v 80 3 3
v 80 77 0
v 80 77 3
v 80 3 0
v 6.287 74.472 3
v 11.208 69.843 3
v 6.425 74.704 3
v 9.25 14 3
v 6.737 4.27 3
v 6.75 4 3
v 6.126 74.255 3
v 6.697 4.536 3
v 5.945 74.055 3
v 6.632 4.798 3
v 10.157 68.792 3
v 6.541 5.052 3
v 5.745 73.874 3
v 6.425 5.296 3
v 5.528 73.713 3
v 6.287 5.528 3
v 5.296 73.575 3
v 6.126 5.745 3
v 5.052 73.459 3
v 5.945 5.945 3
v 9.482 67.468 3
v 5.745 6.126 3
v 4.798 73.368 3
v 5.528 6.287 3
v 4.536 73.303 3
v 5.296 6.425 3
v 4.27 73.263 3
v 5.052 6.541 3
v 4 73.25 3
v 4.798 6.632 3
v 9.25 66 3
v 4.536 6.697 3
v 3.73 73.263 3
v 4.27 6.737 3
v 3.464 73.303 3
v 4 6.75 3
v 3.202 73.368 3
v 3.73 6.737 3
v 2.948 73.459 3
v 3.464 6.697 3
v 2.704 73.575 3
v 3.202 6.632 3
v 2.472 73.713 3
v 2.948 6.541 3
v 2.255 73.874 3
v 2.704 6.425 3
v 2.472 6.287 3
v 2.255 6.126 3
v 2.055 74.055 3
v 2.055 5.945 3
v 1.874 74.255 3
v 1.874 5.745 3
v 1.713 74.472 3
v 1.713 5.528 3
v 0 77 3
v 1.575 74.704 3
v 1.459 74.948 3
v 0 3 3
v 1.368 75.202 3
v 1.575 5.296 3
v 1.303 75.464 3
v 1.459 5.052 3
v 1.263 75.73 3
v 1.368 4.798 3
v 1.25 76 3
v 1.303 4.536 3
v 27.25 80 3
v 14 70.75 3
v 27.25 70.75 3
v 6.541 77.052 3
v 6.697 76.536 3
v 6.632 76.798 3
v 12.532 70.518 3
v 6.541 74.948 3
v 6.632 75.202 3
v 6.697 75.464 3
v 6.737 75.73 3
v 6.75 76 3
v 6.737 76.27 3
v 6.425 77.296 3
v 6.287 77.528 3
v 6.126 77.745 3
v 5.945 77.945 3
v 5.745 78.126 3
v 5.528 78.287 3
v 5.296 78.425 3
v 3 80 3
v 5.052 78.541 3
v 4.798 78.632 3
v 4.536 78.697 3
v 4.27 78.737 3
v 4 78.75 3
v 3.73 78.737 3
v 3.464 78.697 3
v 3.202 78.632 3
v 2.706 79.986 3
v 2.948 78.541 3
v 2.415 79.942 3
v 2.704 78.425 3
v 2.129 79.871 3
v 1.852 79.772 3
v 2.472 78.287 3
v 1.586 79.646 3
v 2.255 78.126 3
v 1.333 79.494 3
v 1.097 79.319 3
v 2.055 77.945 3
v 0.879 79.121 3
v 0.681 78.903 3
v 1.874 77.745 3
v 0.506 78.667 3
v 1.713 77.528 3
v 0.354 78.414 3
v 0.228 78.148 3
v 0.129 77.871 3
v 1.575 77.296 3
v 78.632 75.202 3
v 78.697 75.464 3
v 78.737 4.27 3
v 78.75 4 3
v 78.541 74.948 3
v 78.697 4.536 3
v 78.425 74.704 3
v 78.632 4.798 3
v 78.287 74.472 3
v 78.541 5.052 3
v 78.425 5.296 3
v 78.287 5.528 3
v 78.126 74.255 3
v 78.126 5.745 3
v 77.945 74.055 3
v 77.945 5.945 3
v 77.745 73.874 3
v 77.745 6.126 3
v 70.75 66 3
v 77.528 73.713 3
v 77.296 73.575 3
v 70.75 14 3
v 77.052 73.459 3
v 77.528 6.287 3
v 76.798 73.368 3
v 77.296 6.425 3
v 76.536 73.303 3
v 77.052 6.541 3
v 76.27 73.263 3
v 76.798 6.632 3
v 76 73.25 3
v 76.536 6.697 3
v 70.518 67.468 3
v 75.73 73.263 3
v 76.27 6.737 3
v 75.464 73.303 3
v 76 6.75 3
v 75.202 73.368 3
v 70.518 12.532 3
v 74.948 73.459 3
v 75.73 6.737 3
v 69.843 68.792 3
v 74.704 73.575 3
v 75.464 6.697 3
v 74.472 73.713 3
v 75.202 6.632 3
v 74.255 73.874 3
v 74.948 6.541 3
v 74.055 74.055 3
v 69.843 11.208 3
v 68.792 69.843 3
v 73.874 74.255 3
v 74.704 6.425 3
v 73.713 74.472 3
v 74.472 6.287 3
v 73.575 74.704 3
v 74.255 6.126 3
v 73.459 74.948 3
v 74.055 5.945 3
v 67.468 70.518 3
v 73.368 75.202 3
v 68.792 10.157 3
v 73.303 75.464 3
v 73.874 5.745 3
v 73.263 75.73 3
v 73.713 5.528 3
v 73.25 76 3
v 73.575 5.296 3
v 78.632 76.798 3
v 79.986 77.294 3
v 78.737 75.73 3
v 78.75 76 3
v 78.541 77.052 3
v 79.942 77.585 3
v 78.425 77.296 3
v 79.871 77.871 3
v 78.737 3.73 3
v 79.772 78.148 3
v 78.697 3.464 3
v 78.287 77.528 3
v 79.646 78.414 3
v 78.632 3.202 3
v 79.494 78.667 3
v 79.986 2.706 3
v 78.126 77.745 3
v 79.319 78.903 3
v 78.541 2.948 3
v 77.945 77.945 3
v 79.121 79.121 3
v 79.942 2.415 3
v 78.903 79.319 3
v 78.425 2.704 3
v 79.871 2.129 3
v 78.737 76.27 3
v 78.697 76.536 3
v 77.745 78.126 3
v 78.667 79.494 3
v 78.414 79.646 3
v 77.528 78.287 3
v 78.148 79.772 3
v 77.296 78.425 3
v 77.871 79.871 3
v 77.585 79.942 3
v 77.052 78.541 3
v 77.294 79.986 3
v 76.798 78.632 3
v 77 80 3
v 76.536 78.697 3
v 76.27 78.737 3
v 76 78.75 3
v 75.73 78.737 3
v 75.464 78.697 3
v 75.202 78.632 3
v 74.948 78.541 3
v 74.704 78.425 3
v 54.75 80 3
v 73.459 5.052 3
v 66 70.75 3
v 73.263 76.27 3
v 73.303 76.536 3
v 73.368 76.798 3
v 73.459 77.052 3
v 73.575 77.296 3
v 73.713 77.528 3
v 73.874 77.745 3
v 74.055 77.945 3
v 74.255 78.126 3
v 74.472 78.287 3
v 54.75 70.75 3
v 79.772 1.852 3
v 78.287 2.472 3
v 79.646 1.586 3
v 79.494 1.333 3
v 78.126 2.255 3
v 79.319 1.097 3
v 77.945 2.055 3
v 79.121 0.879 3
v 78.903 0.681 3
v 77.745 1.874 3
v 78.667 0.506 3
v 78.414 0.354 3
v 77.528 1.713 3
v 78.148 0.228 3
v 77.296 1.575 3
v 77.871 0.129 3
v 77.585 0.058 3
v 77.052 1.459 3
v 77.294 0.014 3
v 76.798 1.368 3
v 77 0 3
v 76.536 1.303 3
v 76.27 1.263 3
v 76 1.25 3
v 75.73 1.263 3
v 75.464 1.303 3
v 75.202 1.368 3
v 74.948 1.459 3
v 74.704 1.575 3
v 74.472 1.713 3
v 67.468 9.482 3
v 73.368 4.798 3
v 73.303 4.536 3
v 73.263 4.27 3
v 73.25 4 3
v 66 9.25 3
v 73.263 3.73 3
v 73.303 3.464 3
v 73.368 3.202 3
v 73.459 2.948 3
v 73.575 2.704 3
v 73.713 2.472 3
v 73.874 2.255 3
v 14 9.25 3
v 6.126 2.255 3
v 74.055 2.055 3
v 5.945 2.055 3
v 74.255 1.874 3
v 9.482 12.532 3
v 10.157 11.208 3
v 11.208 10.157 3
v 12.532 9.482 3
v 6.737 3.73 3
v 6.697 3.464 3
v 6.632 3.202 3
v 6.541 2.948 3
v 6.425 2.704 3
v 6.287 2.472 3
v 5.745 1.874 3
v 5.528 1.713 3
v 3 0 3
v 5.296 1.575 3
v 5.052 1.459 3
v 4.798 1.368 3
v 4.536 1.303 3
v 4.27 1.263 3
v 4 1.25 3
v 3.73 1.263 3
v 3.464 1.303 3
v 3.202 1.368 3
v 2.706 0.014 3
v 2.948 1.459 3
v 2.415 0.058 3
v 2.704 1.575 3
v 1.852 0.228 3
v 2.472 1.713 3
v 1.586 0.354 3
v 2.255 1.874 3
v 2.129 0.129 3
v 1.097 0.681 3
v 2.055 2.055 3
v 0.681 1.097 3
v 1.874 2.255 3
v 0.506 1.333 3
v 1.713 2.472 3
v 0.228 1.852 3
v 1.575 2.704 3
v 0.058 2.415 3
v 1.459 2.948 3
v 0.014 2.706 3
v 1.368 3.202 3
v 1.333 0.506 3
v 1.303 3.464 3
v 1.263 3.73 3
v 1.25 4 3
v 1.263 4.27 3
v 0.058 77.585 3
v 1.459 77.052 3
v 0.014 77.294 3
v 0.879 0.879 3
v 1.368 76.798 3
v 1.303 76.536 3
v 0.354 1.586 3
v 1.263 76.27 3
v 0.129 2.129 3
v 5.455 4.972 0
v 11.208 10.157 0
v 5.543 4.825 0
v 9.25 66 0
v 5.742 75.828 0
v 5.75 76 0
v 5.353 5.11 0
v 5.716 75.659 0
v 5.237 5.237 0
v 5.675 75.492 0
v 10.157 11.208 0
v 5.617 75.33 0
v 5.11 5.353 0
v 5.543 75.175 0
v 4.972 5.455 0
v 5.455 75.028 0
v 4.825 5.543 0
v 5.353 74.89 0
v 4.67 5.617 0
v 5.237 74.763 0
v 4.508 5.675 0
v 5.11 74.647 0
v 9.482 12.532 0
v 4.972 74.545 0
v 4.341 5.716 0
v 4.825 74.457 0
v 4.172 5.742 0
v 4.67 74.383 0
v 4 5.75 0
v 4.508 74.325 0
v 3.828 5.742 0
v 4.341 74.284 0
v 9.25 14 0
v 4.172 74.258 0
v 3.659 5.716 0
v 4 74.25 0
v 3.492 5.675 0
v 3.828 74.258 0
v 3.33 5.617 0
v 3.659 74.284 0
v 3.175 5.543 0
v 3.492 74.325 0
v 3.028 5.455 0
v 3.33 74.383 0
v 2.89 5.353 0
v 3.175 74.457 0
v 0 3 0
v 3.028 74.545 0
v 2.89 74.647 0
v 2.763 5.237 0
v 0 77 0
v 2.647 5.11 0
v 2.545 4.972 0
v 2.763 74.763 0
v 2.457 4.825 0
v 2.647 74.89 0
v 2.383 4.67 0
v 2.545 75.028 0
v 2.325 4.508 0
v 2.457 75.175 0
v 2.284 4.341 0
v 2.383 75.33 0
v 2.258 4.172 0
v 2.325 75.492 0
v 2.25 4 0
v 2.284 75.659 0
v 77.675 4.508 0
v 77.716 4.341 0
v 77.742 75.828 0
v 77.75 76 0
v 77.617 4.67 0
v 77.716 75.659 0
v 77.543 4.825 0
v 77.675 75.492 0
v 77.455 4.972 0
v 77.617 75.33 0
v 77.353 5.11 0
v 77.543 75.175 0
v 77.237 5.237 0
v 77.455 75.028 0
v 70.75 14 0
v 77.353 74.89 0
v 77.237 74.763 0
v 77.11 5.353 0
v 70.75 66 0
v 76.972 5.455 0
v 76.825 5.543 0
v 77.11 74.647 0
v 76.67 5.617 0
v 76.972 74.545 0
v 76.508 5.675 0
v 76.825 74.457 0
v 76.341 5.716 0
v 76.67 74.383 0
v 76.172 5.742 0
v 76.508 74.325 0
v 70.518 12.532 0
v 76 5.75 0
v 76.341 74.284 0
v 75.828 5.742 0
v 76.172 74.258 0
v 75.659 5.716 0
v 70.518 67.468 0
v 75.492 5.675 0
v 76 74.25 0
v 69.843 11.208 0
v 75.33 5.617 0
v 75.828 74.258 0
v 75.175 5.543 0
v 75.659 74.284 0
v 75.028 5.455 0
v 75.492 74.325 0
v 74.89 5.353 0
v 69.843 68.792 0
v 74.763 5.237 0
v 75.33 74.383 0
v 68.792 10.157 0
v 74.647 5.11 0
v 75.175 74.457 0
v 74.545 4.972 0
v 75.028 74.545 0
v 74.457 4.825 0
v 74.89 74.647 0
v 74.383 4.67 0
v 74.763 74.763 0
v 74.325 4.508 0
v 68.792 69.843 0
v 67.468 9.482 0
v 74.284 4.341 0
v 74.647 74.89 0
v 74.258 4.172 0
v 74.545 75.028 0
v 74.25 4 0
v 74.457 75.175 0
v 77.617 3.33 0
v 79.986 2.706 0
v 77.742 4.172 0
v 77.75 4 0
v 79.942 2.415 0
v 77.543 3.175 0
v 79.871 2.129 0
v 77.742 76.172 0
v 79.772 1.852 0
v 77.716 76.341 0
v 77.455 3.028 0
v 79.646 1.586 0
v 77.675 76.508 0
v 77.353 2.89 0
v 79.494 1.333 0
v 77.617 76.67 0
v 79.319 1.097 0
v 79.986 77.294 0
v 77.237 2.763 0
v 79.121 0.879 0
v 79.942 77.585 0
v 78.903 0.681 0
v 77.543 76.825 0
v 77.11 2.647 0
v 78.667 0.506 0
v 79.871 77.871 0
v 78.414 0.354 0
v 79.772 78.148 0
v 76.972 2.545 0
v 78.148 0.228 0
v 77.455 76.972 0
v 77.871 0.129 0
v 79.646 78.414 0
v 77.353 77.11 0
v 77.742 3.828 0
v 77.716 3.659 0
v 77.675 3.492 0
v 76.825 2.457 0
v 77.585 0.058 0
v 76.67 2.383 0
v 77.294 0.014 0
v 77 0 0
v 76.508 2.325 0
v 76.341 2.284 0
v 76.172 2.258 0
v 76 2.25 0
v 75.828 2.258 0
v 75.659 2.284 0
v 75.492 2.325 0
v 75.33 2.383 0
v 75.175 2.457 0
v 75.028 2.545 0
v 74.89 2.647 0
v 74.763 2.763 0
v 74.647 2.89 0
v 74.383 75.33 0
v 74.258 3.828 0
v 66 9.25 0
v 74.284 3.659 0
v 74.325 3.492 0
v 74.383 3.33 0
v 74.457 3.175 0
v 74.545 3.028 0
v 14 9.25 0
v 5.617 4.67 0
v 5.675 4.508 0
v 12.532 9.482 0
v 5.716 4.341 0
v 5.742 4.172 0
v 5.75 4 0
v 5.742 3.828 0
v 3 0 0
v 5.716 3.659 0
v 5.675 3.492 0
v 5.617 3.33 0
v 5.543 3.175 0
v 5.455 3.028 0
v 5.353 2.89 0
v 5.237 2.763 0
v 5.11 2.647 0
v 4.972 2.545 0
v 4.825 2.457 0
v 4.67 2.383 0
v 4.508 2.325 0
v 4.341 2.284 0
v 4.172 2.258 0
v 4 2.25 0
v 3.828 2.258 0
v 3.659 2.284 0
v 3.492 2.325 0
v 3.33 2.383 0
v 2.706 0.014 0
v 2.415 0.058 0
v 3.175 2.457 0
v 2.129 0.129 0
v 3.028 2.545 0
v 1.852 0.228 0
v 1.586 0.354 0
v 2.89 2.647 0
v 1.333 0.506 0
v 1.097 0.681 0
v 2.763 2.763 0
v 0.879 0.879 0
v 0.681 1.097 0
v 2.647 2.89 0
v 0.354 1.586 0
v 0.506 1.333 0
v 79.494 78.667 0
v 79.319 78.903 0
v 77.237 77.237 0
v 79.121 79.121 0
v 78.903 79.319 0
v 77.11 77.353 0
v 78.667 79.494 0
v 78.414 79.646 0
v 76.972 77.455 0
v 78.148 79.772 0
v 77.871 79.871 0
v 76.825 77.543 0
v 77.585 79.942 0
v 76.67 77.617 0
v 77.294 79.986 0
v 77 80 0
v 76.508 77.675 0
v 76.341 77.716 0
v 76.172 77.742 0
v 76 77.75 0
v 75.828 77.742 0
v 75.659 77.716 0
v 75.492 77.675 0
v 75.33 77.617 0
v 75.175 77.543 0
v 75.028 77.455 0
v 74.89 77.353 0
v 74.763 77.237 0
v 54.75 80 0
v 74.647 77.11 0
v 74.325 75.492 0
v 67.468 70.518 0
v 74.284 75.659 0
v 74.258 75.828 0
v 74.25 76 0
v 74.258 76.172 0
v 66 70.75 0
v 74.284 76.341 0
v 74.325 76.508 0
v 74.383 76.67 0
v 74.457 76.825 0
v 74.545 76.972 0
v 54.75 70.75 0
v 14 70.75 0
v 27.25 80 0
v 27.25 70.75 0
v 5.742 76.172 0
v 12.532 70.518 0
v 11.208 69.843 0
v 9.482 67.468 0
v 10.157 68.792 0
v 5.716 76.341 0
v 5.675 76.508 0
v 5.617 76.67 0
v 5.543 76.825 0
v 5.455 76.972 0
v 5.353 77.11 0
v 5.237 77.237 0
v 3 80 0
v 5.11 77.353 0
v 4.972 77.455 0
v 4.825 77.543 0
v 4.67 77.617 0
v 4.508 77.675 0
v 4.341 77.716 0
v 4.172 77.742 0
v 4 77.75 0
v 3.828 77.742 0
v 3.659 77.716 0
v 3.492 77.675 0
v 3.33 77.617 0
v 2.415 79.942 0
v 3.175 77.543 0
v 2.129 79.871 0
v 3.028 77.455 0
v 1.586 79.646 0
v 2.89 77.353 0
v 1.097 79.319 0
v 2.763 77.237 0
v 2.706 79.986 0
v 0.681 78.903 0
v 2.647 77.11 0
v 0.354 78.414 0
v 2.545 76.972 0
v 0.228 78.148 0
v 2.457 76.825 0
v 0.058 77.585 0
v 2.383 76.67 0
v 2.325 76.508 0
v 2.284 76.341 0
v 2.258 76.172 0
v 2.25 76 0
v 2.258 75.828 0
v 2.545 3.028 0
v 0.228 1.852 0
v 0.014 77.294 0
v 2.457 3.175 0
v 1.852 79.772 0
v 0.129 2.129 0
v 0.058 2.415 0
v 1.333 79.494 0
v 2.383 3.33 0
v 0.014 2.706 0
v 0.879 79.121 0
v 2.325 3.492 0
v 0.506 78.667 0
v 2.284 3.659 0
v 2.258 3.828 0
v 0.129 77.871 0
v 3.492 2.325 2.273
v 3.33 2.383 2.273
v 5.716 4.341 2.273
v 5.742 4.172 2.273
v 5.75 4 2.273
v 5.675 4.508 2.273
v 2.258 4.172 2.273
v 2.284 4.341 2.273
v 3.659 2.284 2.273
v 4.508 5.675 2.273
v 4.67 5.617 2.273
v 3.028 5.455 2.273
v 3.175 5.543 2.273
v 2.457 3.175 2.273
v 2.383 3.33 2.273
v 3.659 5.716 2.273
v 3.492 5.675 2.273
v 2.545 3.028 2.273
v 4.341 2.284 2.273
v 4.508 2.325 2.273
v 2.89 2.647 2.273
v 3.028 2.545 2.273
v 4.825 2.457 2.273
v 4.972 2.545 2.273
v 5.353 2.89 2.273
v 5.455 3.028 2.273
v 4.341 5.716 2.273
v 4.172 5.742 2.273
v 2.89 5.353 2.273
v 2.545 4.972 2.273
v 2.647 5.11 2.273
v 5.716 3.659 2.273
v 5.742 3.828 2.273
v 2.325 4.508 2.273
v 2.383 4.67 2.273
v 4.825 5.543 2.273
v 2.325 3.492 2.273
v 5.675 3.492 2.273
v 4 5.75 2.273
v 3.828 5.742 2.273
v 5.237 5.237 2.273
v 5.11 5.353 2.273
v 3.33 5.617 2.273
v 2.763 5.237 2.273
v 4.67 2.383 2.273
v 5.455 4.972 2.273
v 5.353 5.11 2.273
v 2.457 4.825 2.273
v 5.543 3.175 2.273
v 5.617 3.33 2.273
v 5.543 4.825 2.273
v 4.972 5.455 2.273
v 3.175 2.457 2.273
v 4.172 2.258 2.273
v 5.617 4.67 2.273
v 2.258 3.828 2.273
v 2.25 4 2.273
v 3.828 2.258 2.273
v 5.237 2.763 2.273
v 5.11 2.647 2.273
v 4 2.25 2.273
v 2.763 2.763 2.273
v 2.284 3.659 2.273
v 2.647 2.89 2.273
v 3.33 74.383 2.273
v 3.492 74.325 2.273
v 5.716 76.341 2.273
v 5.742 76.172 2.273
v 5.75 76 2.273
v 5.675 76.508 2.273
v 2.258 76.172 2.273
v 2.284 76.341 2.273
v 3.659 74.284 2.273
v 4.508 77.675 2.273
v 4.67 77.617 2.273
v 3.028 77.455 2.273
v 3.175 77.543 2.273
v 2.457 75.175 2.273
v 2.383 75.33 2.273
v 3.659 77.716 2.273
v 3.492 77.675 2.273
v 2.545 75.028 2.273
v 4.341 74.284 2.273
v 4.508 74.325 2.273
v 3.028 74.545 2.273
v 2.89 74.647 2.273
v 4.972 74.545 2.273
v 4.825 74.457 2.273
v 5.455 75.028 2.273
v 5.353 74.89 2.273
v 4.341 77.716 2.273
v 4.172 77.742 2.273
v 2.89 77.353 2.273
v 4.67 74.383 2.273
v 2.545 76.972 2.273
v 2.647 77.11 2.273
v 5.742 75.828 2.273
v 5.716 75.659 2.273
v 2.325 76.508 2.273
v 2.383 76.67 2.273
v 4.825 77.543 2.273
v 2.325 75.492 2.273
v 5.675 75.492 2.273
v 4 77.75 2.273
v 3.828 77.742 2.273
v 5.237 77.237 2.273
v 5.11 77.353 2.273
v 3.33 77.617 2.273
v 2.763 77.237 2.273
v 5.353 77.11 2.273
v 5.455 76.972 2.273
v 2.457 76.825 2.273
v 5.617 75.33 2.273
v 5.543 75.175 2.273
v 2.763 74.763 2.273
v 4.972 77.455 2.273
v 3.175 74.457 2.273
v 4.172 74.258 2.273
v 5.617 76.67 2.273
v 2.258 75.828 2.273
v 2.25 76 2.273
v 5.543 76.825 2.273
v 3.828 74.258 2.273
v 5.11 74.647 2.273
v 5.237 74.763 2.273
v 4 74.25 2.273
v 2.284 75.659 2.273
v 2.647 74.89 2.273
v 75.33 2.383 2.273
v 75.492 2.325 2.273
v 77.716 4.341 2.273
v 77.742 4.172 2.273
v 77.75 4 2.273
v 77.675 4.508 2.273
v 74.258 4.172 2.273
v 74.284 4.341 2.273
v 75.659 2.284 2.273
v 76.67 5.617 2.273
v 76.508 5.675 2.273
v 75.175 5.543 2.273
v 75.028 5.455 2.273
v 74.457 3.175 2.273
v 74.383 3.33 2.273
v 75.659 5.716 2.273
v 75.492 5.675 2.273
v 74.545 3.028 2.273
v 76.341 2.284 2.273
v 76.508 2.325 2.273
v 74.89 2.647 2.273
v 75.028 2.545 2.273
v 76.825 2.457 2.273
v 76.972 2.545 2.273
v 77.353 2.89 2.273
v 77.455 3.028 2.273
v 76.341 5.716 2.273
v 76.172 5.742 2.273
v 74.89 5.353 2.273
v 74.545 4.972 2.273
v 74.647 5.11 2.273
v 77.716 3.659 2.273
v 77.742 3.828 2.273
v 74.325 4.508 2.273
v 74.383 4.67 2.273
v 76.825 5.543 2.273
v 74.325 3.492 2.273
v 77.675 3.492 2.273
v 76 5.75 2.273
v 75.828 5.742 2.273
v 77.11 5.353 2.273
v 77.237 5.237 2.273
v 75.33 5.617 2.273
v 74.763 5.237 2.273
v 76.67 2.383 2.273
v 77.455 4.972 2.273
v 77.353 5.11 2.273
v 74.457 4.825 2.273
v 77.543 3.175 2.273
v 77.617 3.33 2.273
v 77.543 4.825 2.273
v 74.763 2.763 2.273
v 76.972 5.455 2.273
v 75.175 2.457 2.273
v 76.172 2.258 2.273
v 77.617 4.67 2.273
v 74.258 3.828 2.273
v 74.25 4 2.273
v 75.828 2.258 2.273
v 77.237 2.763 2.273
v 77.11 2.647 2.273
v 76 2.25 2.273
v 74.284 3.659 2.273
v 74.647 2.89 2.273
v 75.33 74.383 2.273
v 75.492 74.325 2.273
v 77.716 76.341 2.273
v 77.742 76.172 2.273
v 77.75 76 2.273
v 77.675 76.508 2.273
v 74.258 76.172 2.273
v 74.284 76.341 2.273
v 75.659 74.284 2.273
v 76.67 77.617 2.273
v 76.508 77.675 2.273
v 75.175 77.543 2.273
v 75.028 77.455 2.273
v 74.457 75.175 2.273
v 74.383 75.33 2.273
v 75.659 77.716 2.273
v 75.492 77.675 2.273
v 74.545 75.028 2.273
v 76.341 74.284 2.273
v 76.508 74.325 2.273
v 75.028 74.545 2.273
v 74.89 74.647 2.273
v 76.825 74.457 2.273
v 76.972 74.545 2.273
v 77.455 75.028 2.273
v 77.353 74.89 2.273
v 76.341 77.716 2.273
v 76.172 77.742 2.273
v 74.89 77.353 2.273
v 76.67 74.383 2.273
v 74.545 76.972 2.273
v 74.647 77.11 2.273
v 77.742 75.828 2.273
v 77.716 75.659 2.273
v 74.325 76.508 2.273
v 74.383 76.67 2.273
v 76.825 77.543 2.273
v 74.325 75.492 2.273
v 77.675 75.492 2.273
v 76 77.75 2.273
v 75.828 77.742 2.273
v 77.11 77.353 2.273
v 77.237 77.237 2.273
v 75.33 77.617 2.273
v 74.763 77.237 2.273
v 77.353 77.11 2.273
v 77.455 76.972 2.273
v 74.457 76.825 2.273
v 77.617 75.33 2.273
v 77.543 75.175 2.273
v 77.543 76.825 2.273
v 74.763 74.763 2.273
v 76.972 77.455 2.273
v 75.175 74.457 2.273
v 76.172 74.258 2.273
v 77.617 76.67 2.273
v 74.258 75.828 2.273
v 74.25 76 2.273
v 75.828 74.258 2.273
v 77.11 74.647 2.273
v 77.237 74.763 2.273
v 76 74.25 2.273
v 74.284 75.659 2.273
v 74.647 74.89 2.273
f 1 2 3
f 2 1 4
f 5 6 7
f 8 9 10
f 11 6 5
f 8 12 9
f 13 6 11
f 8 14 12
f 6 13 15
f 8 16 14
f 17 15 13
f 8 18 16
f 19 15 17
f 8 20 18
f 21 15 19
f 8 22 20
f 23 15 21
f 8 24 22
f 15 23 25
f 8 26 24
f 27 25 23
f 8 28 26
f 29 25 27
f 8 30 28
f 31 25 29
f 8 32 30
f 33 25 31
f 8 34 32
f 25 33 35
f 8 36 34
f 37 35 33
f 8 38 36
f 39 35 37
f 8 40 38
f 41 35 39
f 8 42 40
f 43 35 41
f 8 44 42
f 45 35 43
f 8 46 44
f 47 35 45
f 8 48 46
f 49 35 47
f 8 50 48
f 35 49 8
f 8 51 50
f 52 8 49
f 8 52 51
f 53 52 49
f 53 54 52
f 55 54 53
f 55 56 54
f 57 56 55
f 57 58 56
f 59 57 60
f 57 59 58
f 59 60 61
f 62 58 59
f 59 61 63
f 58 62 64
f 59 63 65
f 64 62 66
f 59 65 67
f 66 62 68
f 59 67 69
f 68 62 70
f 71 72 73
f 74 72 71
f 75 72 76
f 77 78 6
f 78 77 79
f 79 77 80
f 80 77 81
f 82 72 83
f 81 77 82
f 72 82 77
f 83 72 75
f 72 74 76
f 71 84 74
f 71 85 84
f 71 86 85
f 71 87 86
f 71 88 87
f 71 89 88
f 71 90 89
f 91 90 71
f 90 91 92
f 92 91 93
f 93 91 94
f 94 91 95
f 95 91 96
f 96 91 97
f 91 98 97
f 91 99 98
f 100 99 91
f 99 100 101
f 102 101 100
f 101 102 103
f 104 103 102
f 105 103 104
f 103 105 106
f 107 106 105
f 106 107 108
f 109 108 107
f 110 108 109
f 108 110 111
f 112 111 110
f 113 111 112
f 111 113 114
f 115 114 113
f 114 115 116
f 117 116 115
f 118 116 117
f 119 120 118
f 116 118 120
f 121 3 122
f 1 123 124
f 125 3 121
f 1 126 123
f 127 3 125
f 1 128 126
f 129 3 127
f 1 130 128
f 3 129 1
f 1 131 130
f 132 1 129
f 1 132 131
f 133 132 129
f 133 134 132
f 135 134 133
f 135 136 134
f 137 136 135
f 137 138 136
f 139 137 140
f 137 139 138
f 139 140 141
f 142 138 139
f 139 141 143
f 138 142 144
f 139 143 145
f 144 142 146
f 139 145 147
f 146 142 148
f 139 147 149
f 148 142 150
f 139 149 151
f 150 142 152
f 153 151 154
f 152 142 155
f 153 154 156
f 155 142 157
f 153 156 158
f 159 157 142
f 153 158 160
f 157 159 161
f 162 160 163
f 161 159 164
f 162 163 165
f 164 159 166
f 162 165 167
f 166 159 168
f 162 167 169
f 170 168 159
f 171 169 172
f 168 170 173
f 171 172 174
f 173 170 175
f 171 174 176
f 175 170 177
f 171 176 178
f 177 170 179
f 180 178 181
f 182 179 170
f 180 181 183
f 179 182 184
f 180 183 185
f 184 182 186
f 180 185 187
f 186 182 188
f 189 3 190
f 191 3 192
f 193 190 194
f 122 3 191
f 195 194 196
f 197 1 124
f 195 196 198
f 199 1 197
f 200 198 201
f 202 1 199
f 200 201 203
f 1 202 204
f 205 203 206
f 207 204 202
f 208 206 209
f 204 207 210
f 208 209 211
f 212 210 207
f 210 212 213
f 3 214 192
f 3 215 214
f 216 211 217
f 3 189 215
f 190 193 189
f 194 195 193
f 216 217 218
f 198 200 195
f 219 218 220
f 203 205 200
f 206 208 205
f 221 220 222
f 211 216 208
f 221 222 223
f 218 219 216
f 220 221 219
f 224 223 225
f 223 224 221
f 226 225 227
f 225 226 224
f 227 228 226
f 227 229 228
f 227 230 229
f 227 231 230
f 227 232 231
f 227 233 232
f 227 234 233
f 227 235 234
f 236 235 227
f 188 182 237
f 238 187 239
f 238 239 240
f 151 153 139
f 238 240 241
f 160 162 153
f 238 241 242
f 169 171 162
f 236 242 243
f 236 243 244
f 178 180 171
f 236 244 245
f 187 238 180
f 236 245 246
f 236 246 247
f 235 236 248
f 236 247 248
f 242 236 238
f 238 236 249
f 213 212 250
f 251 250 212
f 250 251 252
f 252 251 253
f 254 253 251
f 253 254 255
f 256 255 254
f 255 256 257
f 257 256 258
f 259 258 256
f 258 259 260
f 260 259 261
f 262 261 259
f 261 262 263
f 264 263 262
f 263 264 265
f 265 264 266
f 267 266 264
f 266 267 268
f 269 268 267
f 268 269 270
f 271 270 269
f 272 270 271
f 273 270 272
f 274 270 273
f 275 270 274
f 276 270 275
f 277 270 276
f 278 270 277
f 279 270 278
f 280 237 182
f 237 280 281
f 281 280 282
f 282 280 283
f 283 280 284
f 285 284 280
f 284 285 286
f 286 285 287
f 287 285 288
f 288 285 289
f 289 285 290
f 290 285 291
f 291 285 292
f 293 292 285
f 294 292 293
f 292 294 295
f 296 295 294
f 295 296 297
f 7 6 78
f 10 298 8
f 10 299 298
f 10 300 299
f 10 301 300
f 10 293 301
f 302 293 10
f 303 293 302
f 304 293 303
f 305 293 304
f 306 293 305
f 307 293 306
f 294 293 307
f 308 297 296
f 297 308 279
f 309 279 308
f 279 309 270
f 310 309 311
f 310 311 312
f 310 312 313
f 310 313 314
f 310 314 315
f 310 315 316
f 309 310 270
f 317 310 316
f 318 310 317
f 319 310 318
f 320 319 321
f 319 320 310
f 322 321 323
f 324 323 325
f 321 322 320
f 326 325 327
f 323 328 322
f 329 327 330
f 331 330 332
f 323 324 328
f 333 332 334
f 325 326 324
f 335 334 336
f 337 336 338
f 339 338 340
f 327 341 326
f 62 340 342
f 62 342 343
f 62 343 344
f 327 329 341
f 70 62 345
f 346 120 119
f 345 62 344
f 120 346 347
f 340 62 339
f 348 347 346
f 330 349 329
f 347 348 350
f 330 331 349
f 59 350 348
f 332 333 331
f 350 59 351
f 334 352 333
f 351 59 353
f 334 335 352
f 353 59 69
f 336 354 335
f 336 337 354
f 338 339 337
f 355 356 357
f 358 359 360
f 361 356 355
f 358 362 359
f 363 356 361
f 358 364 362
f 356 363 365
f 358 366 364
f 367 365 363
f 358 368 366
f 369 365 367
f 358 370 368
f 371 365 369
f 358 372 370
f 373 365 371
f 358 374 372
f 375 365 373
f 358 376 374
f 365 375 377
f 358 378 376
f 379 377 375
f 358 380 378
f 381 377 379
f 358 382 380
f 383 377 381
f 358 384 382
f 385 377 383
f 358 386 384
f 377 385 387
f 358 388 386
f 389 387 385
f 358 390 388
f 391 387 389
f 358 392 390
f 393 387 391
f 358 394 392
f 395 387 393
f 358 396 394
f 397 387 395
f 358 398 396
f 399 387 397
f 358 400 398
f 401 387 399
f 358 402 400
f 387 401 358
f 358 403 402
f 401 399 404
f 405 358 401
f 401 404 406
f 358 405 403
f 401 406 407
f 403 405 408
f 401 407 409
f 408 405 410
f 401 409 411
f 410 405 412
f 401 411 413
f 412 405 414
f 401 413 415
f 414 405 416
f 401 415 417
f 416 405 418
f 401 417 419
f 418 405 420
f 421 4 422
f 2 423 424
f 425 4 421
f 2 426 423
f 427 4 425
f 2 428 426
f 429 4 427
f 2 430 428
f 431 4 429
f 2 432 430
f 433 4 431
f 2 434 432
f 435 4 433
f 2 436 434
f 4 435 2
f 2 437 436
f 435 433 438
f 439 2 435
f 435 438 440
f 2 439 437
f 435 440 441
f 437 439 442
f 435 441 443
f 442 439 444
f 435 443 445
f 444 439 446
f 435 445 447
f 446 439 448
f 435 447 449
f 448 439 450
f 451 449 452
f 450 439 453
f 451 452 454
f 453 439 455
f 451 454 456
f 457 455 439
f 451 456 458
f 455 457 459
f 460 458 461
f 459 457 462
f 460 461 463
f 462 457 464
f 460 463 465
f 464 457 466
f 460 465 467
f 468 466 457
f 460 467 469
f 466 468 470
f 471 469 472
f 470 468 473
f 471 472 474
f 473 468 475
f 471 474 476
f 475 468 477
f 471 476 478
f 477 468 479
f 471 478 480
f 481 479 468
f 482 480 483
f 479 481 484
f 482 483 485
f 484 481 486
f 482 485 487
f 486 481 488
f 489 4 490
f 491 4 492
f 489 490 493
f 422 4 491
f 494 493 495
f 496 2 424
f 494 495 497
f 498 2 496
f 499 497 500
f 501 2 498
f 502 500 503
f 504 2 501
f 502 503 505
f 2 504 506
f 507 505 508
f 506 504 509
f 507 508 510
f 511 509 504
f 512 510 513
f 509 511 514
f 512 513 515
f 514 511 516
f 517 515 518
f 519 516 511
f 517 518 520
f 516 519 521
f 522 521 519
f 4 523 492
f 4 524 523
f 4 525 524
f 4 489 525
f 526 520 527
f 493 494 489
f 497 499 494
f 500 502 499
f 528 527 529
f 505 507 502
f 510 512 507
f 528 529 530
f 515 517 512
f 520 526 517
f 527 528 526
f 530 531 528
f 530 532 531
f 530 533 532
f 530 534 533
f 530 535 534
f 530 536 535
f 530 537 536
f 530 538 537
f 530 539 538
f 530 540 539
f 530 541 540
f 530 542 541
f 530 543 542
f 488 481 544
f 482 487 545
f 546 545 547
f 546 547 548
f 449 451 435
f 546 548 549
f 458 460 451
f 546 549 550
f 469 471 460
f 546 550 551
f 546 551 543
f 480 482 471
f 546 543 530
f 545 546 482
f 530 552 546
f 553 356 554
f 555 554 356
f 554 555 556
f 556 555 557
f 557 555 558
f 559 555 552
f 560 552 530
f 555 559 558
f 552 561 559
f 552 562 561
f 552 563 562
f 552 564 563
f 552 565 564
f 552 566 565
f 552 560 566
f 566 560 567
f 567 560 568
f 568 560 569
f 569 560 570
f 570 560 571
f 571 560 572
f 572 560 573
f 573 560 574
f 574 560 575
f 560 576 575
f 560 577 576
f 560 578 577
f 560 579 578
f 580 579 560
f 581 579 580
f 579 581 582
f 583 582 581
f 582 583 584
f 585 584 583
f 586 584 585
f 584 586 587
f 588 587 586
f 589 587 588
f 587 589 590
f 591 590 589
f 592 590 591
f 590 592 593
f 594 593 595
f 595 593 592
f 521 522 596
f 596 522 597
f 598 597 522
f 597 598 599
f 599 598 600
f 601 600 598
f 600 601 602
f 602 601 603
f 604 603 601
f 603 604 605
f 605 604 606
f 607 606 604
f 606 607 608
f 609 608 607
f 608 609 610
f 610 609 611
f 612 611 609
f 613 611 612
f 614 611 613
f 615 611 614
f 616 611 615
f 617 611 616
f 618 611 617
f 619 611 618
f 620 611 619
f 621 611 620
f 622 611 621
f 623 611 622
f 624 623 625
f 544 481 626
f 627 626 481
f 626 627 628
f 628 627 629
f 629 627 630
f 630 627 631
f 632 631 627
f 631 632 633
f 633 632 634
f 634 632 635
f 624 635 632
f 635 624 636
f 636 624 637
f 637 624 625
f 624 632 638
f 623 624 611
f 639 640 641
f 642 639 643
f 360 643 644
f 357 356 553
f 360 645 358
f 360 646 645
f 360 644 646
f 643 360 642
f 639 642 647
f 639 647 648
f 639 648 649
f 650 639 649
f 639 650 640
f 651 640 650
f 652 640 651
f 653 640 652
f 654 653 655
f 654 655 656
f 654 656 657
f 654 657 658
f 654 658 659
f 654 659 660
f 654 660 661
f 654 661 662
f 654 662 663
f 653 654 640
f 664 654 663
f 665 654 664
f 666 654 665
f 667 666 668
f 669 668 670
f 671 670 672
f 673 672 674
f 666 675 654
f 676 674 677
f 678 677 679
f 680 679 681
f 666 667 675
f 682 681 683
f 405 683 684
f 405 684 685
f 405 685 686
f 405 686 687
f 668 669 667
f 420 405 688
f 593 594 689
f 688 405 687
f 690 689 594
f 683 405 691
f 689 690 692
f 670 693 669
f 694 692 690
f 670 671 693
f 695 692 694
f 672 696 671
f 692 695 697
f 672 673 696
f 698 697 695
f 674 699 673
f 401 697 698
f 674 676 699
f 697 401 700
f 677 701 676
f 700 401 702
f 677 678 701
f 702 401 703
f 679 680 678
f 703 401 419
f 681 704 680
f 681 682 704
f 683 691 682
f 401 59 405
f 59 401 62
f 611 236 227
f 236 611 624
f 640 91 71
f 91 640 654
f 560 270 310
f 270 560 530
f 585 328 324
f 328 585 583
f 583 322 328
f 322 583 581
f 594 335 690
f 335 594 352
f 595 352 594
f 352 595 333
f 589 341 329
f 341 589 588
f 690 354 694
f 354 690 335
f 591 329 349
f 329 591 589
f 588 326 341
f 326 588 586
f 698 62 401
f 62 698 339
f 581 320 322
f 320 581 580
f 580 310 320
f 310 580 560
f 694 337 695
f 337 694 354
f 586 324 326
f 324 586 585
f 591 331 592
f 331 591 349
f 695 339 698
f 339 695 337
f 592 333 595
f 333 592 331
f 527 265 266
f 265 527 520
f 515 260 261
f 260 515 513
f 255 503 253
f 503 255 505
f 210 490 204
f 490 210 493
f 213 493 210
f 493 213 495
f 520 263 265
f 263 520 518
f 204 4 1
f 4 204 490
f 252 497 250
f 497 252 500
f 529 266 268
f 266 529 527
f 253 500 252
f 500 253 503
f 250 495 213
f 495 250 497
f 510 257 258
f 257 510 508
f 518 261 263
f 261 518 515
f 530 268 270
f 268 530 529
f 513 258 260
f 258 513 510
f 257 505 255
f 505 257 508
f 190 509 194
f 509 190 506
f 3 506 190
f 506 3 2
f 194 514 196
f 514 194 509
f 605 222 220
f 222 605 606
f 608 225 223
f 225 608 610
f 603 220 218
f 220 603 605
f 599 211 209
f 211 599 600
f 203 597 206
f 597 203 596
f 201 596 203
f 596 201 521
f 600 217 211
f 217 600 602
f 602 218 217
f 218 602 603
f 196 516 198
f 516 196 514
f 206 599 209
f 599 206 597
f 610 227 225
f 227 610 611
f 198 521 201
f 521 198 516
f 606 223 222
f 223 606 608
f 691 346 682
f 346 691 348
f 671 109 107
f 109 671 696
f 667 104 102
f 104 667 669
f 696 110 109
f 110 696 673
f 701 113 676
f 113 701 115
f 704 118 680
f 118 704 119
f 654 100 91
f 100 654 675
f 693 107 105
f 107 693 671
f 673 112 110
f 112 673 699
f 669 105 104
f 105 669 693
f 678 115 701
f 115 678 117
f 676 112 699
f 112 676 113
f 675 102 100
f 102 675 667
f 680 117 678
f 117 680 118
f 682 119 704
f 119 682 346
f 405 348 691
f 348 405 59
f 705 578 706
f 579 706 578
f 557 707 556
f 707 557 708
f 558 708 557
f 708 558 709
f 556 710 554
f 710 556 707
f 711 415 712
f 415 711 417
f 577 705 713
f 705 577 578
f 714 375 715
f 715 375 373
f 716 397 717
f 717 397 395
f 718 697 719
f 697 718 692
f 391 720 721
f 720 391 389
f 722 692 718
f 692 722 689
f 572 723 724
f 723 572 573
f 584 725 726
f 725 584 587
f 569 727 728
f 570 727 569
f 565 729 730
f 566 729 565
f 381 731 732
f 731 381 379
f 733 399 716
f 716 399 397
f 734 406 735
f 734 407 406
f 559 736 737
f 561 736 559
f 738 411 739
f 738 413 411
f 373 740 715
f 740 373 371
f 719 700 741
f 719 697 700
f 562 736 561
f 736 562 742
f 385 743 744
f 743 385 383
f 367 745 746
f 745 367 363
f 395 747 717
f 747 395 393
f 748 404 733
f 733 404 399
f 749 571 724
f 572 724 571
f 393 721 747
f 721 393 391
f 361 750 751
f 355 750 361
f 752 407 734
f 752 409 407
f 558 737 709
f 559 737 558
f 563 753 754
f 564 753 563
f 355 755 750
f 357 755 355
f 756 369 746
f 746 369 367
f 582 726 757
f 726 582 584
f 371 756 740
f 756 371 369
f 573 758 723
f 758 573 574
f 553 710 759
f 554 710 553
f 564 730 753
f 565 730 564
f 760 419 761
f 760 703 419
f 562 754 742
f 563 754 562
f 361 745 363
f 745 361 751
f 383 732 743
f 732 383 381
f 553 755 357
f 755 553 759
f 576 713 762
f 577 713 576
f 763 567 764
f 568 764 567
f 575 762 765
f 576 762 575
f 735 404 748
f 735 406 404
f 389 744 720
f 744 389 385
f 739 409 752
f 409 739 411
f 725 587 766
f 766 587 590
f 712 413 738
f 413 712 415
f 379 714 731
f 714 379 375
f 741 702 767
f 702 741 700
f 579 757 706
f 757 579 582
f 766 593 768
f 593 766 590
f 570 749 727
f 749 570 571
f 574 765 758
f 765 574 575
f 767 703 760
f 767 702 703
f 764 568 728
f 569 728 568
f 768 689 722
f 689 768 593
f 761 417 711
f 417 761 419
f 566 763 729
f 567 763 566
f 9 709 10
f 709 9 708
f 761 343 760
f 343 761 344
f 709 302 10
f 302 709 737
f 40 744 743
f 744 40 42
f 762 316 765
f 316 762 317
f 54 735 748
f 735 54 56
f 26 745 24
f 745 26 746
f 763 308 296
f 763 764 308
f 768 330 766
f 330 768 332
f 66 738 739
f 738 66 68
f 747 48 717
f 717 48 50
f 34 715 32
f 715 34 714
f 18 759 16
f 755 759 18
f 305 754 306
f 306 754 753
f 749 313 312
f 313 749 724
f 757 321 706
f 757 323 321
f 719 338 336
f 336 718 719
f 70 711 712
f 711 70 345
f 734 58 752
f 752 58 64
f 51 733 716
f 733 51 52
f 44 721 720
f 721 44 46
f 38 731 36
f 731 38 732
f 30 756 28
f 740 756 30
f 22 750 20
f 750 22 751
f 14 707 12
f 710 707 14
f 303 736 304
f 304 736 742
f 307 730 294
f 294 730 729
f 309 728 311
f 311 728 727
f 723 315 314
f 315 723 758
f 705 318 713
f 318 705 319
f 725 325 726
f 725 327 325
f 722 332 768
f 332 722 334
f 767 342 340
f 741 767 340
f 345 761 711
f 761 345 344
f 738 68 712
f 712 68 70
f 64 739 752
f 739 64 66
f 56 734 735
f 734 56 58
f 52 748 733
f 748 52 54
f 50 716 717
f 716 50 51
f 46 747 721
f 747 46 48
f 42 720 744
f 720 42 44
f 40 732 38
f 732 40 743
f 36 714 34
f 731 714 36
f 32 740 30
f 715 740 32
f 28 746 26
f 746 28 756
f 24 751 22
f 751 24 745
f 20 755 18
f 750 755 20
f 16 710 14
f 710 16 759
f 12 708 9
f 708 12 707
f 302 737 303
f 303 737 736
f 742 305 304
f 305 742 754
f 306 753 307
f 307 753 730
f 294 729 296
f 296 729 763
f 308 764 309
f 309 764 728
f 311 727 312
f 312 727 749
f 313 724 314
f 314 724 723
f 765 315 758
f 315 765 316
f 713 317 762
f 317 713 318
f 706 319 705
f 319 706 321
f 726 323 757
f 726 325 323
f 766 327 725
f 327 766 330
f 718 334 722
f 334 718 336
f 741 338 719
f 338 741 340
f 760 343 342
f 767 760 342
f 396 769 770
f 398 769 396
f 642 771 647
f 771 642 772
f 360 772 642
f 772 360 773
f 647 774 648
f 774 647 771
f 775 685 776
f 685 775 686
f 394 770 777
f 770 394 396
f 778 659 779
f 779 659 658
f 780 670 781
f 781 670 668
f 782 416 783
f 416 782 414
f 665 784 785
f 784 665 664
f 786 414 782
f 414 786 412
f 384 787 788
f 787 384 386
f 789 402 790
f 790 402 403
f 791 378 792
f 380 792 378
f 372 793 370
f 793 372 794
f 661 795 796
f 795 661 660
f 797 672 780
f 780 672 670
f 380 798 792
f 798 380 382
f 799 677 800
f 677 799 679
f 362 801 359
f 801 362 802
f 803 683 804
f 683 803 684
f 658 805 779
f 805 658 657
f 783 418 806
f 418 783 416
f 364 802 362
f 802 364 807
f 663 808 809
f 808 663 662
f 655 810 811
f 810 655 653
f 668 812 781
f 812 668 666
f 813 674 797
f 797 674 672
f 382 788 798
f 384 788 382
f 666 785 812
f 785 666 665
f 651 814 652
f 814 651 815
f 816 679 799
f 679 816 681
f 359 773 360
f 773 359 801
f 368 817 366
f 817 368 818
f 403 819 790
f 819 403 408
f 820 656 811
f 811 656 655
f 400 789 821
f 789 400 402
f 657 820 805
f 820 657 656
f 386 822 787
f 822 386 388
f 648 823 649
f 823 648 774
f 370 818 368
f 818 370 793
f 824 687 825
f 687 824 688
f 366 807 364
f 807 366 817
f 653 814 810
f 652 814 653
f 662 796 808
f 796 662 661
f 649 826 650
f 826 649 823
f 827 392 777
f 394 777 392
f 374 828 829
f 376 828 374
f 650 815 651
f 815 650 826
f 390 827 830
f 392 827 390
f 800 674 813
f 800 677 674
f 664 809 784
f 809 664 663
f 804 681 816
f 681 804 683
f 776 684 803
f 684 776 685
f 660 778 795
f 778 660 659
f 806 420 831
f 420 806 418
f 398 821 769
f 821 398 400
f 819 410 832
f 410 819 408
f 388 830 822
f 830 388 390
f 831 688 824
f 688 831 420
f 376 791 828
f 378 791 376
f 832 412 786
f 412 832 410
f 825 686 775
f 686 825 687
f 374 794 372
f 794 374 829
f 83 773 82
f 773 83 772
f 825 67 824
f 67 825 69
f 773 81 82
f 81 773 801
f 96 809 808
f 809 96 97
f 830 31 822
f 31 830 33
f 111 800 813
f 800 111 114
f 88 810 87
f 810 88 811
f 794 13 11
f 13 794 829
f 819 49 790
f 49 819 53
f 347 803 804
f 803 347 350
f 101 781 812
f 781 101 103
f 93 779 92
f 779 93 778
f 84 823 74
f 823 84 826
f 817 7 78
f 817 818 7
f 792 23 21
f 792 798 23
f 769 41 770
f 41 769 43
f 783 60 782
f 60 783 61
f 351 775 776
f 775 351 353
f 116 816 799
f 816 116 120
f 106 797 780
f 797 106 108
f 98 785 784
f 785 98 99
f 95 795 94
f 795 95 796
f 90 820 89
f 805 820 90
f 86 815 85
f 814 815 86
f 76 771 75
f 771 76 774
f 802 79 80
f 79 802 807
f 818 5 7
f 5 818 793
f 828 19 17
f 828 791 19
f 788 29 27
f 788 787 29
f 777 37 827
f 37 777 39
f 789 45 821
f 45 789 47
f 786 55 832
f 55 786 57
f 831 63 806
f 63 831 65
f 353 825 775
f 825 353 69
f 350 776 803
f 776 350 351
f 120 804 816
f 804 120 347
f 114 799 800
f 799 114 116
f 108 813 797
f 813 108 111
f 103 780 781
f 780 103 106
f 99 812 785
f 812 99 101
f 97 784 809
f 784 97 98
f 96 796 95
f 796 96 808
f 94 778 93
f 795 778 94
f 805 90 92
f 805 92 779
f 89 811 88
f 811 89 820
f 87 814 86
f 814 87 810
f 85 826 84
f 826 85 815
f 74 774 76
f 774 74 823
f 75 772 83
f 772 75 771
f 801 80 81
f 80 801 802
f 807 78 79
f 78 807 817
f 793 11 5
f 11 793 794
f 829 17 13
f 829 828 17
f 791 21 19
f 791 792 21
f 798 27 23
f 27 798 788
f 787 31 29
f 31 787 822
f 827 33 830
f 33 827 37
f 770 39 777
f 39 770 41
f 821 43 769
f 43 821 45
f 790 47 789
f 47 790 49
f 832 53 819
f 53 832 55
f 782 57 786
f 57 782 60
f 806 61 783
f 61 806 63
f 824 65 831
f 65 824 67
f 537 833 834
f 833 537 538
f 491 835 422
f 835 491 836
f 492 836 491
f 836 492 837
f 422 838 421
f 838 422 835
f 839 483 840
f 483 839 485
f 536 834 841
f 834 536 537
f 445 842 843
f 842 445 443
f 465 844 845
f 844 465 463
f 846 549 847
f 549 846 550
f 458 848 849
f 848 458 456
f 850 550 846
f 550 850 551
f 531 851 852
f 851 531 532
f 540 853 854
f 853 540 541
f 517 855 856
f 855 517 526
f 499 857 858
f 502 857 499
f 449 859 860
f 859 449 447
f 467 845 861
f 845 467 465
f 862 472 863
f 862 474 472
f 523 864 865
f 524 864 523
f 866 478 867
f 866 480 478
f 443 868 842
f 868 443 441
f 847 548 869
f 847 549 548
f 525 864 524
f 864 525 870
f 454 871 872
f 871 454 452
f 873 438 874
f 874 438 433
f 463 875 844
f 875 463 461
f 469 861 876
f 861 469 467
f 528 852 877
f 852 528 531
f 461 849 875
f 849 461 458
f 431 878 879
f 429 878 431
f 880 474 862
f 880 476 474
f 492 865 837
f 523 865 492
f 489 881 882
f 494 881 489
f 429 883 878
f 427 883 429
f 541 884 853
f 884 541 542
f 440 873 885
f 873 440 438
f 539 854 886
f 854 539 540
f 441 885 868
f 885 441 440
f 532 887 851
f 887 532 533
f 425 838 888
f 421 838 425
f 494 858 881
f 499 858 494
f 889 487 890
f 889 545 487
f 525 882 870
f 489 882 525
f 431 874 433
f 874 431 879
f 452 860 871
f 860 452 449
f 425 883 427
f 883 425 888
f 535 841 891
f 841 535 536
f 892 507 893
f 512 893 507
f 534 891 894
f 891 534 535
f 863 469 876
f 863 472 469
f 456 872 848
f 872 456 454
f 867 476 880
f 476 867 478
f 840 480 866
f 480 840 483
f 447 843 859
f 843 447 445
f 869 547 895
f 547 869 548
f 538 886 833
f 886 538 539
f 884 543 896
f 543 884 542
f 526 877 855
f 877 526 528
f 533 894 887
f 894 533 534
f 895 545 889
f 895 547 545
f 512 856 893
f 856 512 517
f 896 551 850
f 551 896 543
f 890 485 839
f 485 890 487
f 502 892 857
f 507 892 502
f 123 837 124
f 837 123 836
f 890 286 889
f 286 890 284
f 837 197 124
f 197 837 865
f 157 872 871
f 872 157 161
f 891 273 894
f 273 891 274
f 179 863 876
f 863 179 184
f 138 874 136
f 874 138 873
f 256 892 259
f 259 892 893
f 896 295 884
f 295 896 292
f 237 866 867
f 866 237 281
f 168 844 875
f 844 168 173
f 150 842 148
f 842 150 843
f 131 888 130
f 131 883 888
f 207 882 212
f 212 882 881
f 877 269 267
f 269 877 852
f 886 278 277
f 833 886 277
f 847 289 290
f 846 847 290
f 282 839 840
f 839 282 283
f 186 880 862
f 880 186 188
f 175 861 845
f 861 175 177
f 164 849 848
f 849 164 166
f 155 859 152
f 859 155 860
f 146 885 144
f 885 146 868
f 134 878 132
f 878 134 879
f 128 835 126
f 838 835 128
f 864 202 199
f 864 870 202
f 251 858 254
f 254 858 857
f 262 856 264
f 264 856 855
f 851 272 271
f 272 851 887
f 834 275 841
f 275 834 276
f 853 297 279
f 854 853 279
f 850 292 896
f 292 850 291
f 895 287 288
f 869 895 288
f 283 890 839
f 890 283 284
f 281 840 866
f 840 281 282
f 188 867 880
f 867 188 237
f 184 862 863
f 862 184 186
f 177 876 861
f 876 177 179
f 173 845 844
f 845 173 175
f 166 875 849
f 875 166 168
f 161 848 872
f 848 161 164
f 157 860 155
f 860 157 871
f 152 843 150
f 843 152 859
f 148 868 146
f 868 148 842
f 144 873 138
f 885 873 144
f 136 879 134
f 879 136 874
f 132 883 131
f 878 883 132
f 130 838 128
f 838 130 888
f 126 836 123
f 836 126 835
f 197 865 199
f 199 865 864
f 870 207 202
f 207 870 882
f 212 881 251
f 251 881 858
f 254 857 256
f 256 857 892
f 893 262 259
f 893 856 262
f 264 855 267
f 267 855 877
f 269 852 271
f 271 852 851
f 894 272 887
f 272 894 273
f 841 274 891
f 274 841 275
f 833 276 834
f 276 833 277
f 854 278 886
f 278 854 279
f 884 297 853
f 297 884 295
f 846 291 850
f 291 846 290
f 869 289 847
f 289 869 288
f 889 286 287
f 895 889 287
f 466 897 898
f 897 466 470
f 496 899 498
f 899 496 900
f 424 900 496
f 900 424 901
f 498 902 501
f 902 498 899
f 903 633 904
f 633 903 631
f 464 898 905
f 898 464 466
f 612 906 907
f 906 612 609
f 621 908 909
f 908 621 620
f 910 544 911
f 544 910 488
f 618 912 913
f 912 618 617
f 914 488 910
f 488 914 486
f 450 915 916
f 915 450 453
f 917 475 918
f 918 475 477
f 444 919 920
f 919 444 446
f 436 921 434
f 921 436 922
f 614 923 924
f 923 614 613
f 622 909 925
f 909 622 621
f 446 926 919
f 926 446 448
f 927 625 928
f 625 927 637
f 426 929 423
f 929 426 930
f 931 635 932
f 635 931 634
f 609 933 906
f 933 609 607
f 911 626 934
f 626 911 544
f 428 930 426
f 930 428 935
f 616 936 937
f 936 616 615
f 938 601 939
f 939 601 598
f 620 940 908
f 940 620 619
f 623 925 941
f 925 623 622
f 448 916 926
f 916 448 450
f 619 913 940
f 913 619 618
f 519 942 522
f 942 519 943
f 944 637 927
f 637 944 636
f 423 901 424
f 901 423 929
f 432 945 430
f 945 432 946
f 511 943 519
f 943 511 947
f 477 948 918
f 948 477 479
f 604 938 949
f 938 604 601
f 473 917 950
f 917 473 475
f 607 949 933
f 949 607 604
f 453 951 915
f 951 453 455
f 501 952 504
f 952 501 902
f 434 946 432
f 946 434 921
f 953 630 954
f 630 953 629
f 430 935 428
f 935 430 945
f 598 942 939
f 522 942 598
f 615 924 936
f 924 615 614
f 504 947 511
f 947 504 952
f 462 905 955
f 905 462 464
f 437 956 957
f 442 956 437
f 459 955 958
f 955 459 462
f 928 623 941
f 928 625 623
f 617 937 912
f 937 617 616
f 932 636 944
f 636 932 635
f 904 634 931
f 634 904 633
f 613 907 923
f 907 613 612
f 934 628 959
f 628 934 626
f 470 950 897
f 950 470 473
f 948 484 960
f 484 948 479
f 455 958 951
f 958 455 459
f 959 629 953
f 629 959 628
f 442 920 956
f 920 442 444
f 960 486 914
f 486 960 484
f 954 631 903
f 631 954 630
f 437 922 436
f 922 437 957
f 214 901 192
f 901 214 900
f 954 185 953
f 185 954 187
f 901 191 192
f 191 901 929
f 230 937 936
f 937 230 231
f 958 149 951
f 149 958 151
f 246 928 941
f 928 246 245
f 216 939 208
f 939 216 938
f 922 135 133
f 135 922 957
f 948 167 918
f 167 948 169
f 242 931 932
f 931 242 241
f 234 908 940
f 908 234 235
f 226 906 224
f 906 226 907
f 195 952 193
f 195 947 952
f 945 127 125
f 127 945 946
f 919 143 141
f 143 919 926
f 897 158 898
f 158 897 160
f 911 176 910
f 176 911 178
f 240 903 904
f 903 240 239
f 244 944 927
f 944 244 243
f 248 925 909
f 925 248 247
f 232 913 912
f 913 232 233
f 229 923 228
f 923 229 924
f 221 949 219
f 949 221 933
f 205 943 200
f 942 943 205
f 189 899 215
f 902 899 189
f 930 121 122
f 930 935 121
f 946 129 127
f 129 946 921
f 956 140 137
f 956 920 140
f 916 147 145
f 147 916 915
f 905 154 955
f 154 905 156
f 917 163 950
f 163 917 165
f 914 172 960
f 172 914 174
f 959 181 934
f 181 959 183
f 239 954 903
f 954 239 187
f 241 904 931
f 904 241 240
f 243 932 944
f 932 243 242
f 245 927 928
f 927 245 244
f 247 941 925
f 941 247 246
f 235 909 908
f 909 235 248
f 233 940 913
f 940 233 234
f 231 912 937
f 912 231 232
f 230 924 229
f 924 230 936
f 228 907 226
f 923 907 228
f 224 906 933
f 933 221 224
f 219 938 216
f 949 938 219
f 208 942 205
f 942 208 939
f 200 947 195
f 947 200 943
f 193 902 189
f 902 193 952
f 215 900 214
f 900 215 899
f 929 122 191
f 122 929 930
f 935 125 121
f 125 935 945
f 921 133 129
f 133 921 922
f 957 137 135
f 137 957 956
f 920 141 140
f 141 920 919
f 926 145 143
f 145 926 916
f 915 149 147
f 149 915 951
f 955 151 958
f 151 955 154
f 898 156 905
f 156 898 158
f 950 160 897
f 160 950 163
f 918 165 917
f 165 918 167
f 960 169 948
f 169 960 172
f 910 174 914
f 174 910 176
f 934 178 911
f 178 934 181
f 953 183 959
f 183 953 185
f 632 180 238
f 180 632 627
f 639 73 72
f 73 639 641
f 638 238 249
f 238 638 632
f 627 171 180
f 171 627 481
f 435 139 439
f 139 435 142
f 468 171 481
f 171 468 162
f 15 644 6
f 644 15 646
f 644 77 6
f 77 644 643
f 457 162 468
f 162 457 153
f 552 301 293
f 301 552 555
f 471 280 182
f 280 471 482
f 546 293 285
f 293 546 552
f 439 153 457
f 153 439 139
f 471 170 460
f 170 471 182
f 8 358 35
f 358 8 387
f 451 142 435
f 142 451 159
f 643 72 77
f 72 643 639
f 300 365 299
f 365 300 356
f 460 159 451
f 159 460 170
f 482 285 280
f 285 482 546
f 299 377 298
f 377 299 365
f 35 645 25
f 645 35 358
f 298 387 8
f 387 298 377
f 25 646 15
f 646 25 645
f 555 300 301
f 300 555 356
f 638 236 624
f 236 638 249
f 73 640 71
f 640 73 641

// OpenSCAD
/* [Size and thickness] */
// fan size in mm
fan_size = 80; // [40:20:200]

tab_width_outer=88.1;
tab_height=13.5;
tab_width=12.5;
tab_offset=5.5;
heater_size=61.5;
heater_straight=52;
heater_depth=4.5;
space_after_depth=3;
fan_depth=space_after_depth;

// fan grill thickness in mm
grill_thickness = fan_depth;

// plastic thickness around the fan hole in mm
vent_wall_thickness = 1;

fan_duct_chamfer = false;

// screw hole type
screw_hole_type = "t"; // [s:Straight, t:Tapered, i:Inset]

/* [Vent grill bars] */
// number of horzontal grill bars
horizontal_bar_count = 1;
// number of vertical grill bars
vertical_bar_count = 1;

// grill bars thickness
bars_thickness = 1;

// grill bars width
bars_width = 1.2;

/* [Hidden] */
$fn = 64;

screw_hole_diameter = 3.5;
screw_hole_radius = screw_hole_diameter / 2;
screw_hole_radius_wider = screw_hole_radius + 1;
screw_support_thickness = 1;
screw_center_distance_from_edge = 4;

module PrimeShape() {
        union() {
        difference() {
            cube([fan_size, fan_size, grill_thickness]);
            
            // corner chamfer
            translate([3,0,-1])
            rotate([0,0,135])
            cube([5, 5, grill_thickness + 2]);

            translate([fan_size-3,0,-1])
            rotate([0,0,-45])
            cube([5, 5, grill_thickness + 2]);

            translate([fan_size,fan_size-3,-1])
            rotate([0,0,45])
            cube([5, 5, grill_thickness + 2]);

            translate([0,fan_size-3,-1])
            rotate([0,0,45])
            cube([5, 5, grill_thickness + 2]);
        }

        // corner roundness
        translate([3,3,grill_thickness/2])
        cylinder(r=3, h=grill_thickness, center=true);

        translate([fan_size-3,3,grill_thickness/2])
        cylinder(r=3, h=grill_thickness, center=true);

        translate([fan_size-3,fan_size-3,grill_thickness/2])
        cylinder(r=3, h=grill_thickness, center=true);

        translate([3,fan_size-3,grill_thickness/2])
        cylinder(r=3, h=grill_thickness, center=true);
    }
}

module PrimeShapeWithScrewHoles() {
    difference() {
        PrimeShape();

        // screw holes
        ScrewHole(screw_center_distance_from_edge, screw_center_distance_from_edge);
        ScrewHole(screw_center_distance_from_edge, fan_size - screw_center_distance_from_edge);
        ScrewHole(fan_size - screw_center_distance_from_edge, screw_center_distance_from_edge);
        ScrewHole(fan_size - screw_center_distance_from_edge, fan_size - screw_center_distance_from_edge);
    }
}

module ScrewHole(x, y) {
    translate([x, y, grill_thickness / 2])
    cylinder(r=screw_hole_diameter / 2, h=grill_thickness + 2, center=true);

    if (screw_hole_type == "i") {
        //inset
        translate([x, y, grill_thickness / 2 + screw_support_thickness])
        cylinder(r=screw_hole_radius + 1, h=grill_thickness, center=true);
    }

    if (screw_hole_type == "t") {
        // tapered
        translate([x, y, grill_thickness])
        cylinder(r1=0, r2=screw_hole_radius_wider * 2, h=4, center=true);
    }
}


module rounded_rect(width, height, corner_radius, extrude_height) {
    linear_extrude(extrude_height)
    minkowski() {
        square([width - 2*corner_radius, height - 2*corner_radius], center=true);
        circle(r=corner_radius,$fn=20);
    }
}

difference(){
    PrimeShapeWithScrewHoles();
    translate([(fan_size)/2,(fan_size)/2,0])
    rounded_rect(heater_size, heater_size, (heater_size-heater_straight)/2,grill_thickness );
    
    translate([(fan_size-heater_size)/2+tab_offset+tab_width,(fan_size-heater_size)/2+heater_size,0])
    cube([tab_width*2.2,tab_height,grill_thickness]);
    // translate([(fan_size-heater_size)/2+heater_size-tab_width-tab_offset,0,0])
    // cube([tab_width,tab_height,tab_offset]);

}
